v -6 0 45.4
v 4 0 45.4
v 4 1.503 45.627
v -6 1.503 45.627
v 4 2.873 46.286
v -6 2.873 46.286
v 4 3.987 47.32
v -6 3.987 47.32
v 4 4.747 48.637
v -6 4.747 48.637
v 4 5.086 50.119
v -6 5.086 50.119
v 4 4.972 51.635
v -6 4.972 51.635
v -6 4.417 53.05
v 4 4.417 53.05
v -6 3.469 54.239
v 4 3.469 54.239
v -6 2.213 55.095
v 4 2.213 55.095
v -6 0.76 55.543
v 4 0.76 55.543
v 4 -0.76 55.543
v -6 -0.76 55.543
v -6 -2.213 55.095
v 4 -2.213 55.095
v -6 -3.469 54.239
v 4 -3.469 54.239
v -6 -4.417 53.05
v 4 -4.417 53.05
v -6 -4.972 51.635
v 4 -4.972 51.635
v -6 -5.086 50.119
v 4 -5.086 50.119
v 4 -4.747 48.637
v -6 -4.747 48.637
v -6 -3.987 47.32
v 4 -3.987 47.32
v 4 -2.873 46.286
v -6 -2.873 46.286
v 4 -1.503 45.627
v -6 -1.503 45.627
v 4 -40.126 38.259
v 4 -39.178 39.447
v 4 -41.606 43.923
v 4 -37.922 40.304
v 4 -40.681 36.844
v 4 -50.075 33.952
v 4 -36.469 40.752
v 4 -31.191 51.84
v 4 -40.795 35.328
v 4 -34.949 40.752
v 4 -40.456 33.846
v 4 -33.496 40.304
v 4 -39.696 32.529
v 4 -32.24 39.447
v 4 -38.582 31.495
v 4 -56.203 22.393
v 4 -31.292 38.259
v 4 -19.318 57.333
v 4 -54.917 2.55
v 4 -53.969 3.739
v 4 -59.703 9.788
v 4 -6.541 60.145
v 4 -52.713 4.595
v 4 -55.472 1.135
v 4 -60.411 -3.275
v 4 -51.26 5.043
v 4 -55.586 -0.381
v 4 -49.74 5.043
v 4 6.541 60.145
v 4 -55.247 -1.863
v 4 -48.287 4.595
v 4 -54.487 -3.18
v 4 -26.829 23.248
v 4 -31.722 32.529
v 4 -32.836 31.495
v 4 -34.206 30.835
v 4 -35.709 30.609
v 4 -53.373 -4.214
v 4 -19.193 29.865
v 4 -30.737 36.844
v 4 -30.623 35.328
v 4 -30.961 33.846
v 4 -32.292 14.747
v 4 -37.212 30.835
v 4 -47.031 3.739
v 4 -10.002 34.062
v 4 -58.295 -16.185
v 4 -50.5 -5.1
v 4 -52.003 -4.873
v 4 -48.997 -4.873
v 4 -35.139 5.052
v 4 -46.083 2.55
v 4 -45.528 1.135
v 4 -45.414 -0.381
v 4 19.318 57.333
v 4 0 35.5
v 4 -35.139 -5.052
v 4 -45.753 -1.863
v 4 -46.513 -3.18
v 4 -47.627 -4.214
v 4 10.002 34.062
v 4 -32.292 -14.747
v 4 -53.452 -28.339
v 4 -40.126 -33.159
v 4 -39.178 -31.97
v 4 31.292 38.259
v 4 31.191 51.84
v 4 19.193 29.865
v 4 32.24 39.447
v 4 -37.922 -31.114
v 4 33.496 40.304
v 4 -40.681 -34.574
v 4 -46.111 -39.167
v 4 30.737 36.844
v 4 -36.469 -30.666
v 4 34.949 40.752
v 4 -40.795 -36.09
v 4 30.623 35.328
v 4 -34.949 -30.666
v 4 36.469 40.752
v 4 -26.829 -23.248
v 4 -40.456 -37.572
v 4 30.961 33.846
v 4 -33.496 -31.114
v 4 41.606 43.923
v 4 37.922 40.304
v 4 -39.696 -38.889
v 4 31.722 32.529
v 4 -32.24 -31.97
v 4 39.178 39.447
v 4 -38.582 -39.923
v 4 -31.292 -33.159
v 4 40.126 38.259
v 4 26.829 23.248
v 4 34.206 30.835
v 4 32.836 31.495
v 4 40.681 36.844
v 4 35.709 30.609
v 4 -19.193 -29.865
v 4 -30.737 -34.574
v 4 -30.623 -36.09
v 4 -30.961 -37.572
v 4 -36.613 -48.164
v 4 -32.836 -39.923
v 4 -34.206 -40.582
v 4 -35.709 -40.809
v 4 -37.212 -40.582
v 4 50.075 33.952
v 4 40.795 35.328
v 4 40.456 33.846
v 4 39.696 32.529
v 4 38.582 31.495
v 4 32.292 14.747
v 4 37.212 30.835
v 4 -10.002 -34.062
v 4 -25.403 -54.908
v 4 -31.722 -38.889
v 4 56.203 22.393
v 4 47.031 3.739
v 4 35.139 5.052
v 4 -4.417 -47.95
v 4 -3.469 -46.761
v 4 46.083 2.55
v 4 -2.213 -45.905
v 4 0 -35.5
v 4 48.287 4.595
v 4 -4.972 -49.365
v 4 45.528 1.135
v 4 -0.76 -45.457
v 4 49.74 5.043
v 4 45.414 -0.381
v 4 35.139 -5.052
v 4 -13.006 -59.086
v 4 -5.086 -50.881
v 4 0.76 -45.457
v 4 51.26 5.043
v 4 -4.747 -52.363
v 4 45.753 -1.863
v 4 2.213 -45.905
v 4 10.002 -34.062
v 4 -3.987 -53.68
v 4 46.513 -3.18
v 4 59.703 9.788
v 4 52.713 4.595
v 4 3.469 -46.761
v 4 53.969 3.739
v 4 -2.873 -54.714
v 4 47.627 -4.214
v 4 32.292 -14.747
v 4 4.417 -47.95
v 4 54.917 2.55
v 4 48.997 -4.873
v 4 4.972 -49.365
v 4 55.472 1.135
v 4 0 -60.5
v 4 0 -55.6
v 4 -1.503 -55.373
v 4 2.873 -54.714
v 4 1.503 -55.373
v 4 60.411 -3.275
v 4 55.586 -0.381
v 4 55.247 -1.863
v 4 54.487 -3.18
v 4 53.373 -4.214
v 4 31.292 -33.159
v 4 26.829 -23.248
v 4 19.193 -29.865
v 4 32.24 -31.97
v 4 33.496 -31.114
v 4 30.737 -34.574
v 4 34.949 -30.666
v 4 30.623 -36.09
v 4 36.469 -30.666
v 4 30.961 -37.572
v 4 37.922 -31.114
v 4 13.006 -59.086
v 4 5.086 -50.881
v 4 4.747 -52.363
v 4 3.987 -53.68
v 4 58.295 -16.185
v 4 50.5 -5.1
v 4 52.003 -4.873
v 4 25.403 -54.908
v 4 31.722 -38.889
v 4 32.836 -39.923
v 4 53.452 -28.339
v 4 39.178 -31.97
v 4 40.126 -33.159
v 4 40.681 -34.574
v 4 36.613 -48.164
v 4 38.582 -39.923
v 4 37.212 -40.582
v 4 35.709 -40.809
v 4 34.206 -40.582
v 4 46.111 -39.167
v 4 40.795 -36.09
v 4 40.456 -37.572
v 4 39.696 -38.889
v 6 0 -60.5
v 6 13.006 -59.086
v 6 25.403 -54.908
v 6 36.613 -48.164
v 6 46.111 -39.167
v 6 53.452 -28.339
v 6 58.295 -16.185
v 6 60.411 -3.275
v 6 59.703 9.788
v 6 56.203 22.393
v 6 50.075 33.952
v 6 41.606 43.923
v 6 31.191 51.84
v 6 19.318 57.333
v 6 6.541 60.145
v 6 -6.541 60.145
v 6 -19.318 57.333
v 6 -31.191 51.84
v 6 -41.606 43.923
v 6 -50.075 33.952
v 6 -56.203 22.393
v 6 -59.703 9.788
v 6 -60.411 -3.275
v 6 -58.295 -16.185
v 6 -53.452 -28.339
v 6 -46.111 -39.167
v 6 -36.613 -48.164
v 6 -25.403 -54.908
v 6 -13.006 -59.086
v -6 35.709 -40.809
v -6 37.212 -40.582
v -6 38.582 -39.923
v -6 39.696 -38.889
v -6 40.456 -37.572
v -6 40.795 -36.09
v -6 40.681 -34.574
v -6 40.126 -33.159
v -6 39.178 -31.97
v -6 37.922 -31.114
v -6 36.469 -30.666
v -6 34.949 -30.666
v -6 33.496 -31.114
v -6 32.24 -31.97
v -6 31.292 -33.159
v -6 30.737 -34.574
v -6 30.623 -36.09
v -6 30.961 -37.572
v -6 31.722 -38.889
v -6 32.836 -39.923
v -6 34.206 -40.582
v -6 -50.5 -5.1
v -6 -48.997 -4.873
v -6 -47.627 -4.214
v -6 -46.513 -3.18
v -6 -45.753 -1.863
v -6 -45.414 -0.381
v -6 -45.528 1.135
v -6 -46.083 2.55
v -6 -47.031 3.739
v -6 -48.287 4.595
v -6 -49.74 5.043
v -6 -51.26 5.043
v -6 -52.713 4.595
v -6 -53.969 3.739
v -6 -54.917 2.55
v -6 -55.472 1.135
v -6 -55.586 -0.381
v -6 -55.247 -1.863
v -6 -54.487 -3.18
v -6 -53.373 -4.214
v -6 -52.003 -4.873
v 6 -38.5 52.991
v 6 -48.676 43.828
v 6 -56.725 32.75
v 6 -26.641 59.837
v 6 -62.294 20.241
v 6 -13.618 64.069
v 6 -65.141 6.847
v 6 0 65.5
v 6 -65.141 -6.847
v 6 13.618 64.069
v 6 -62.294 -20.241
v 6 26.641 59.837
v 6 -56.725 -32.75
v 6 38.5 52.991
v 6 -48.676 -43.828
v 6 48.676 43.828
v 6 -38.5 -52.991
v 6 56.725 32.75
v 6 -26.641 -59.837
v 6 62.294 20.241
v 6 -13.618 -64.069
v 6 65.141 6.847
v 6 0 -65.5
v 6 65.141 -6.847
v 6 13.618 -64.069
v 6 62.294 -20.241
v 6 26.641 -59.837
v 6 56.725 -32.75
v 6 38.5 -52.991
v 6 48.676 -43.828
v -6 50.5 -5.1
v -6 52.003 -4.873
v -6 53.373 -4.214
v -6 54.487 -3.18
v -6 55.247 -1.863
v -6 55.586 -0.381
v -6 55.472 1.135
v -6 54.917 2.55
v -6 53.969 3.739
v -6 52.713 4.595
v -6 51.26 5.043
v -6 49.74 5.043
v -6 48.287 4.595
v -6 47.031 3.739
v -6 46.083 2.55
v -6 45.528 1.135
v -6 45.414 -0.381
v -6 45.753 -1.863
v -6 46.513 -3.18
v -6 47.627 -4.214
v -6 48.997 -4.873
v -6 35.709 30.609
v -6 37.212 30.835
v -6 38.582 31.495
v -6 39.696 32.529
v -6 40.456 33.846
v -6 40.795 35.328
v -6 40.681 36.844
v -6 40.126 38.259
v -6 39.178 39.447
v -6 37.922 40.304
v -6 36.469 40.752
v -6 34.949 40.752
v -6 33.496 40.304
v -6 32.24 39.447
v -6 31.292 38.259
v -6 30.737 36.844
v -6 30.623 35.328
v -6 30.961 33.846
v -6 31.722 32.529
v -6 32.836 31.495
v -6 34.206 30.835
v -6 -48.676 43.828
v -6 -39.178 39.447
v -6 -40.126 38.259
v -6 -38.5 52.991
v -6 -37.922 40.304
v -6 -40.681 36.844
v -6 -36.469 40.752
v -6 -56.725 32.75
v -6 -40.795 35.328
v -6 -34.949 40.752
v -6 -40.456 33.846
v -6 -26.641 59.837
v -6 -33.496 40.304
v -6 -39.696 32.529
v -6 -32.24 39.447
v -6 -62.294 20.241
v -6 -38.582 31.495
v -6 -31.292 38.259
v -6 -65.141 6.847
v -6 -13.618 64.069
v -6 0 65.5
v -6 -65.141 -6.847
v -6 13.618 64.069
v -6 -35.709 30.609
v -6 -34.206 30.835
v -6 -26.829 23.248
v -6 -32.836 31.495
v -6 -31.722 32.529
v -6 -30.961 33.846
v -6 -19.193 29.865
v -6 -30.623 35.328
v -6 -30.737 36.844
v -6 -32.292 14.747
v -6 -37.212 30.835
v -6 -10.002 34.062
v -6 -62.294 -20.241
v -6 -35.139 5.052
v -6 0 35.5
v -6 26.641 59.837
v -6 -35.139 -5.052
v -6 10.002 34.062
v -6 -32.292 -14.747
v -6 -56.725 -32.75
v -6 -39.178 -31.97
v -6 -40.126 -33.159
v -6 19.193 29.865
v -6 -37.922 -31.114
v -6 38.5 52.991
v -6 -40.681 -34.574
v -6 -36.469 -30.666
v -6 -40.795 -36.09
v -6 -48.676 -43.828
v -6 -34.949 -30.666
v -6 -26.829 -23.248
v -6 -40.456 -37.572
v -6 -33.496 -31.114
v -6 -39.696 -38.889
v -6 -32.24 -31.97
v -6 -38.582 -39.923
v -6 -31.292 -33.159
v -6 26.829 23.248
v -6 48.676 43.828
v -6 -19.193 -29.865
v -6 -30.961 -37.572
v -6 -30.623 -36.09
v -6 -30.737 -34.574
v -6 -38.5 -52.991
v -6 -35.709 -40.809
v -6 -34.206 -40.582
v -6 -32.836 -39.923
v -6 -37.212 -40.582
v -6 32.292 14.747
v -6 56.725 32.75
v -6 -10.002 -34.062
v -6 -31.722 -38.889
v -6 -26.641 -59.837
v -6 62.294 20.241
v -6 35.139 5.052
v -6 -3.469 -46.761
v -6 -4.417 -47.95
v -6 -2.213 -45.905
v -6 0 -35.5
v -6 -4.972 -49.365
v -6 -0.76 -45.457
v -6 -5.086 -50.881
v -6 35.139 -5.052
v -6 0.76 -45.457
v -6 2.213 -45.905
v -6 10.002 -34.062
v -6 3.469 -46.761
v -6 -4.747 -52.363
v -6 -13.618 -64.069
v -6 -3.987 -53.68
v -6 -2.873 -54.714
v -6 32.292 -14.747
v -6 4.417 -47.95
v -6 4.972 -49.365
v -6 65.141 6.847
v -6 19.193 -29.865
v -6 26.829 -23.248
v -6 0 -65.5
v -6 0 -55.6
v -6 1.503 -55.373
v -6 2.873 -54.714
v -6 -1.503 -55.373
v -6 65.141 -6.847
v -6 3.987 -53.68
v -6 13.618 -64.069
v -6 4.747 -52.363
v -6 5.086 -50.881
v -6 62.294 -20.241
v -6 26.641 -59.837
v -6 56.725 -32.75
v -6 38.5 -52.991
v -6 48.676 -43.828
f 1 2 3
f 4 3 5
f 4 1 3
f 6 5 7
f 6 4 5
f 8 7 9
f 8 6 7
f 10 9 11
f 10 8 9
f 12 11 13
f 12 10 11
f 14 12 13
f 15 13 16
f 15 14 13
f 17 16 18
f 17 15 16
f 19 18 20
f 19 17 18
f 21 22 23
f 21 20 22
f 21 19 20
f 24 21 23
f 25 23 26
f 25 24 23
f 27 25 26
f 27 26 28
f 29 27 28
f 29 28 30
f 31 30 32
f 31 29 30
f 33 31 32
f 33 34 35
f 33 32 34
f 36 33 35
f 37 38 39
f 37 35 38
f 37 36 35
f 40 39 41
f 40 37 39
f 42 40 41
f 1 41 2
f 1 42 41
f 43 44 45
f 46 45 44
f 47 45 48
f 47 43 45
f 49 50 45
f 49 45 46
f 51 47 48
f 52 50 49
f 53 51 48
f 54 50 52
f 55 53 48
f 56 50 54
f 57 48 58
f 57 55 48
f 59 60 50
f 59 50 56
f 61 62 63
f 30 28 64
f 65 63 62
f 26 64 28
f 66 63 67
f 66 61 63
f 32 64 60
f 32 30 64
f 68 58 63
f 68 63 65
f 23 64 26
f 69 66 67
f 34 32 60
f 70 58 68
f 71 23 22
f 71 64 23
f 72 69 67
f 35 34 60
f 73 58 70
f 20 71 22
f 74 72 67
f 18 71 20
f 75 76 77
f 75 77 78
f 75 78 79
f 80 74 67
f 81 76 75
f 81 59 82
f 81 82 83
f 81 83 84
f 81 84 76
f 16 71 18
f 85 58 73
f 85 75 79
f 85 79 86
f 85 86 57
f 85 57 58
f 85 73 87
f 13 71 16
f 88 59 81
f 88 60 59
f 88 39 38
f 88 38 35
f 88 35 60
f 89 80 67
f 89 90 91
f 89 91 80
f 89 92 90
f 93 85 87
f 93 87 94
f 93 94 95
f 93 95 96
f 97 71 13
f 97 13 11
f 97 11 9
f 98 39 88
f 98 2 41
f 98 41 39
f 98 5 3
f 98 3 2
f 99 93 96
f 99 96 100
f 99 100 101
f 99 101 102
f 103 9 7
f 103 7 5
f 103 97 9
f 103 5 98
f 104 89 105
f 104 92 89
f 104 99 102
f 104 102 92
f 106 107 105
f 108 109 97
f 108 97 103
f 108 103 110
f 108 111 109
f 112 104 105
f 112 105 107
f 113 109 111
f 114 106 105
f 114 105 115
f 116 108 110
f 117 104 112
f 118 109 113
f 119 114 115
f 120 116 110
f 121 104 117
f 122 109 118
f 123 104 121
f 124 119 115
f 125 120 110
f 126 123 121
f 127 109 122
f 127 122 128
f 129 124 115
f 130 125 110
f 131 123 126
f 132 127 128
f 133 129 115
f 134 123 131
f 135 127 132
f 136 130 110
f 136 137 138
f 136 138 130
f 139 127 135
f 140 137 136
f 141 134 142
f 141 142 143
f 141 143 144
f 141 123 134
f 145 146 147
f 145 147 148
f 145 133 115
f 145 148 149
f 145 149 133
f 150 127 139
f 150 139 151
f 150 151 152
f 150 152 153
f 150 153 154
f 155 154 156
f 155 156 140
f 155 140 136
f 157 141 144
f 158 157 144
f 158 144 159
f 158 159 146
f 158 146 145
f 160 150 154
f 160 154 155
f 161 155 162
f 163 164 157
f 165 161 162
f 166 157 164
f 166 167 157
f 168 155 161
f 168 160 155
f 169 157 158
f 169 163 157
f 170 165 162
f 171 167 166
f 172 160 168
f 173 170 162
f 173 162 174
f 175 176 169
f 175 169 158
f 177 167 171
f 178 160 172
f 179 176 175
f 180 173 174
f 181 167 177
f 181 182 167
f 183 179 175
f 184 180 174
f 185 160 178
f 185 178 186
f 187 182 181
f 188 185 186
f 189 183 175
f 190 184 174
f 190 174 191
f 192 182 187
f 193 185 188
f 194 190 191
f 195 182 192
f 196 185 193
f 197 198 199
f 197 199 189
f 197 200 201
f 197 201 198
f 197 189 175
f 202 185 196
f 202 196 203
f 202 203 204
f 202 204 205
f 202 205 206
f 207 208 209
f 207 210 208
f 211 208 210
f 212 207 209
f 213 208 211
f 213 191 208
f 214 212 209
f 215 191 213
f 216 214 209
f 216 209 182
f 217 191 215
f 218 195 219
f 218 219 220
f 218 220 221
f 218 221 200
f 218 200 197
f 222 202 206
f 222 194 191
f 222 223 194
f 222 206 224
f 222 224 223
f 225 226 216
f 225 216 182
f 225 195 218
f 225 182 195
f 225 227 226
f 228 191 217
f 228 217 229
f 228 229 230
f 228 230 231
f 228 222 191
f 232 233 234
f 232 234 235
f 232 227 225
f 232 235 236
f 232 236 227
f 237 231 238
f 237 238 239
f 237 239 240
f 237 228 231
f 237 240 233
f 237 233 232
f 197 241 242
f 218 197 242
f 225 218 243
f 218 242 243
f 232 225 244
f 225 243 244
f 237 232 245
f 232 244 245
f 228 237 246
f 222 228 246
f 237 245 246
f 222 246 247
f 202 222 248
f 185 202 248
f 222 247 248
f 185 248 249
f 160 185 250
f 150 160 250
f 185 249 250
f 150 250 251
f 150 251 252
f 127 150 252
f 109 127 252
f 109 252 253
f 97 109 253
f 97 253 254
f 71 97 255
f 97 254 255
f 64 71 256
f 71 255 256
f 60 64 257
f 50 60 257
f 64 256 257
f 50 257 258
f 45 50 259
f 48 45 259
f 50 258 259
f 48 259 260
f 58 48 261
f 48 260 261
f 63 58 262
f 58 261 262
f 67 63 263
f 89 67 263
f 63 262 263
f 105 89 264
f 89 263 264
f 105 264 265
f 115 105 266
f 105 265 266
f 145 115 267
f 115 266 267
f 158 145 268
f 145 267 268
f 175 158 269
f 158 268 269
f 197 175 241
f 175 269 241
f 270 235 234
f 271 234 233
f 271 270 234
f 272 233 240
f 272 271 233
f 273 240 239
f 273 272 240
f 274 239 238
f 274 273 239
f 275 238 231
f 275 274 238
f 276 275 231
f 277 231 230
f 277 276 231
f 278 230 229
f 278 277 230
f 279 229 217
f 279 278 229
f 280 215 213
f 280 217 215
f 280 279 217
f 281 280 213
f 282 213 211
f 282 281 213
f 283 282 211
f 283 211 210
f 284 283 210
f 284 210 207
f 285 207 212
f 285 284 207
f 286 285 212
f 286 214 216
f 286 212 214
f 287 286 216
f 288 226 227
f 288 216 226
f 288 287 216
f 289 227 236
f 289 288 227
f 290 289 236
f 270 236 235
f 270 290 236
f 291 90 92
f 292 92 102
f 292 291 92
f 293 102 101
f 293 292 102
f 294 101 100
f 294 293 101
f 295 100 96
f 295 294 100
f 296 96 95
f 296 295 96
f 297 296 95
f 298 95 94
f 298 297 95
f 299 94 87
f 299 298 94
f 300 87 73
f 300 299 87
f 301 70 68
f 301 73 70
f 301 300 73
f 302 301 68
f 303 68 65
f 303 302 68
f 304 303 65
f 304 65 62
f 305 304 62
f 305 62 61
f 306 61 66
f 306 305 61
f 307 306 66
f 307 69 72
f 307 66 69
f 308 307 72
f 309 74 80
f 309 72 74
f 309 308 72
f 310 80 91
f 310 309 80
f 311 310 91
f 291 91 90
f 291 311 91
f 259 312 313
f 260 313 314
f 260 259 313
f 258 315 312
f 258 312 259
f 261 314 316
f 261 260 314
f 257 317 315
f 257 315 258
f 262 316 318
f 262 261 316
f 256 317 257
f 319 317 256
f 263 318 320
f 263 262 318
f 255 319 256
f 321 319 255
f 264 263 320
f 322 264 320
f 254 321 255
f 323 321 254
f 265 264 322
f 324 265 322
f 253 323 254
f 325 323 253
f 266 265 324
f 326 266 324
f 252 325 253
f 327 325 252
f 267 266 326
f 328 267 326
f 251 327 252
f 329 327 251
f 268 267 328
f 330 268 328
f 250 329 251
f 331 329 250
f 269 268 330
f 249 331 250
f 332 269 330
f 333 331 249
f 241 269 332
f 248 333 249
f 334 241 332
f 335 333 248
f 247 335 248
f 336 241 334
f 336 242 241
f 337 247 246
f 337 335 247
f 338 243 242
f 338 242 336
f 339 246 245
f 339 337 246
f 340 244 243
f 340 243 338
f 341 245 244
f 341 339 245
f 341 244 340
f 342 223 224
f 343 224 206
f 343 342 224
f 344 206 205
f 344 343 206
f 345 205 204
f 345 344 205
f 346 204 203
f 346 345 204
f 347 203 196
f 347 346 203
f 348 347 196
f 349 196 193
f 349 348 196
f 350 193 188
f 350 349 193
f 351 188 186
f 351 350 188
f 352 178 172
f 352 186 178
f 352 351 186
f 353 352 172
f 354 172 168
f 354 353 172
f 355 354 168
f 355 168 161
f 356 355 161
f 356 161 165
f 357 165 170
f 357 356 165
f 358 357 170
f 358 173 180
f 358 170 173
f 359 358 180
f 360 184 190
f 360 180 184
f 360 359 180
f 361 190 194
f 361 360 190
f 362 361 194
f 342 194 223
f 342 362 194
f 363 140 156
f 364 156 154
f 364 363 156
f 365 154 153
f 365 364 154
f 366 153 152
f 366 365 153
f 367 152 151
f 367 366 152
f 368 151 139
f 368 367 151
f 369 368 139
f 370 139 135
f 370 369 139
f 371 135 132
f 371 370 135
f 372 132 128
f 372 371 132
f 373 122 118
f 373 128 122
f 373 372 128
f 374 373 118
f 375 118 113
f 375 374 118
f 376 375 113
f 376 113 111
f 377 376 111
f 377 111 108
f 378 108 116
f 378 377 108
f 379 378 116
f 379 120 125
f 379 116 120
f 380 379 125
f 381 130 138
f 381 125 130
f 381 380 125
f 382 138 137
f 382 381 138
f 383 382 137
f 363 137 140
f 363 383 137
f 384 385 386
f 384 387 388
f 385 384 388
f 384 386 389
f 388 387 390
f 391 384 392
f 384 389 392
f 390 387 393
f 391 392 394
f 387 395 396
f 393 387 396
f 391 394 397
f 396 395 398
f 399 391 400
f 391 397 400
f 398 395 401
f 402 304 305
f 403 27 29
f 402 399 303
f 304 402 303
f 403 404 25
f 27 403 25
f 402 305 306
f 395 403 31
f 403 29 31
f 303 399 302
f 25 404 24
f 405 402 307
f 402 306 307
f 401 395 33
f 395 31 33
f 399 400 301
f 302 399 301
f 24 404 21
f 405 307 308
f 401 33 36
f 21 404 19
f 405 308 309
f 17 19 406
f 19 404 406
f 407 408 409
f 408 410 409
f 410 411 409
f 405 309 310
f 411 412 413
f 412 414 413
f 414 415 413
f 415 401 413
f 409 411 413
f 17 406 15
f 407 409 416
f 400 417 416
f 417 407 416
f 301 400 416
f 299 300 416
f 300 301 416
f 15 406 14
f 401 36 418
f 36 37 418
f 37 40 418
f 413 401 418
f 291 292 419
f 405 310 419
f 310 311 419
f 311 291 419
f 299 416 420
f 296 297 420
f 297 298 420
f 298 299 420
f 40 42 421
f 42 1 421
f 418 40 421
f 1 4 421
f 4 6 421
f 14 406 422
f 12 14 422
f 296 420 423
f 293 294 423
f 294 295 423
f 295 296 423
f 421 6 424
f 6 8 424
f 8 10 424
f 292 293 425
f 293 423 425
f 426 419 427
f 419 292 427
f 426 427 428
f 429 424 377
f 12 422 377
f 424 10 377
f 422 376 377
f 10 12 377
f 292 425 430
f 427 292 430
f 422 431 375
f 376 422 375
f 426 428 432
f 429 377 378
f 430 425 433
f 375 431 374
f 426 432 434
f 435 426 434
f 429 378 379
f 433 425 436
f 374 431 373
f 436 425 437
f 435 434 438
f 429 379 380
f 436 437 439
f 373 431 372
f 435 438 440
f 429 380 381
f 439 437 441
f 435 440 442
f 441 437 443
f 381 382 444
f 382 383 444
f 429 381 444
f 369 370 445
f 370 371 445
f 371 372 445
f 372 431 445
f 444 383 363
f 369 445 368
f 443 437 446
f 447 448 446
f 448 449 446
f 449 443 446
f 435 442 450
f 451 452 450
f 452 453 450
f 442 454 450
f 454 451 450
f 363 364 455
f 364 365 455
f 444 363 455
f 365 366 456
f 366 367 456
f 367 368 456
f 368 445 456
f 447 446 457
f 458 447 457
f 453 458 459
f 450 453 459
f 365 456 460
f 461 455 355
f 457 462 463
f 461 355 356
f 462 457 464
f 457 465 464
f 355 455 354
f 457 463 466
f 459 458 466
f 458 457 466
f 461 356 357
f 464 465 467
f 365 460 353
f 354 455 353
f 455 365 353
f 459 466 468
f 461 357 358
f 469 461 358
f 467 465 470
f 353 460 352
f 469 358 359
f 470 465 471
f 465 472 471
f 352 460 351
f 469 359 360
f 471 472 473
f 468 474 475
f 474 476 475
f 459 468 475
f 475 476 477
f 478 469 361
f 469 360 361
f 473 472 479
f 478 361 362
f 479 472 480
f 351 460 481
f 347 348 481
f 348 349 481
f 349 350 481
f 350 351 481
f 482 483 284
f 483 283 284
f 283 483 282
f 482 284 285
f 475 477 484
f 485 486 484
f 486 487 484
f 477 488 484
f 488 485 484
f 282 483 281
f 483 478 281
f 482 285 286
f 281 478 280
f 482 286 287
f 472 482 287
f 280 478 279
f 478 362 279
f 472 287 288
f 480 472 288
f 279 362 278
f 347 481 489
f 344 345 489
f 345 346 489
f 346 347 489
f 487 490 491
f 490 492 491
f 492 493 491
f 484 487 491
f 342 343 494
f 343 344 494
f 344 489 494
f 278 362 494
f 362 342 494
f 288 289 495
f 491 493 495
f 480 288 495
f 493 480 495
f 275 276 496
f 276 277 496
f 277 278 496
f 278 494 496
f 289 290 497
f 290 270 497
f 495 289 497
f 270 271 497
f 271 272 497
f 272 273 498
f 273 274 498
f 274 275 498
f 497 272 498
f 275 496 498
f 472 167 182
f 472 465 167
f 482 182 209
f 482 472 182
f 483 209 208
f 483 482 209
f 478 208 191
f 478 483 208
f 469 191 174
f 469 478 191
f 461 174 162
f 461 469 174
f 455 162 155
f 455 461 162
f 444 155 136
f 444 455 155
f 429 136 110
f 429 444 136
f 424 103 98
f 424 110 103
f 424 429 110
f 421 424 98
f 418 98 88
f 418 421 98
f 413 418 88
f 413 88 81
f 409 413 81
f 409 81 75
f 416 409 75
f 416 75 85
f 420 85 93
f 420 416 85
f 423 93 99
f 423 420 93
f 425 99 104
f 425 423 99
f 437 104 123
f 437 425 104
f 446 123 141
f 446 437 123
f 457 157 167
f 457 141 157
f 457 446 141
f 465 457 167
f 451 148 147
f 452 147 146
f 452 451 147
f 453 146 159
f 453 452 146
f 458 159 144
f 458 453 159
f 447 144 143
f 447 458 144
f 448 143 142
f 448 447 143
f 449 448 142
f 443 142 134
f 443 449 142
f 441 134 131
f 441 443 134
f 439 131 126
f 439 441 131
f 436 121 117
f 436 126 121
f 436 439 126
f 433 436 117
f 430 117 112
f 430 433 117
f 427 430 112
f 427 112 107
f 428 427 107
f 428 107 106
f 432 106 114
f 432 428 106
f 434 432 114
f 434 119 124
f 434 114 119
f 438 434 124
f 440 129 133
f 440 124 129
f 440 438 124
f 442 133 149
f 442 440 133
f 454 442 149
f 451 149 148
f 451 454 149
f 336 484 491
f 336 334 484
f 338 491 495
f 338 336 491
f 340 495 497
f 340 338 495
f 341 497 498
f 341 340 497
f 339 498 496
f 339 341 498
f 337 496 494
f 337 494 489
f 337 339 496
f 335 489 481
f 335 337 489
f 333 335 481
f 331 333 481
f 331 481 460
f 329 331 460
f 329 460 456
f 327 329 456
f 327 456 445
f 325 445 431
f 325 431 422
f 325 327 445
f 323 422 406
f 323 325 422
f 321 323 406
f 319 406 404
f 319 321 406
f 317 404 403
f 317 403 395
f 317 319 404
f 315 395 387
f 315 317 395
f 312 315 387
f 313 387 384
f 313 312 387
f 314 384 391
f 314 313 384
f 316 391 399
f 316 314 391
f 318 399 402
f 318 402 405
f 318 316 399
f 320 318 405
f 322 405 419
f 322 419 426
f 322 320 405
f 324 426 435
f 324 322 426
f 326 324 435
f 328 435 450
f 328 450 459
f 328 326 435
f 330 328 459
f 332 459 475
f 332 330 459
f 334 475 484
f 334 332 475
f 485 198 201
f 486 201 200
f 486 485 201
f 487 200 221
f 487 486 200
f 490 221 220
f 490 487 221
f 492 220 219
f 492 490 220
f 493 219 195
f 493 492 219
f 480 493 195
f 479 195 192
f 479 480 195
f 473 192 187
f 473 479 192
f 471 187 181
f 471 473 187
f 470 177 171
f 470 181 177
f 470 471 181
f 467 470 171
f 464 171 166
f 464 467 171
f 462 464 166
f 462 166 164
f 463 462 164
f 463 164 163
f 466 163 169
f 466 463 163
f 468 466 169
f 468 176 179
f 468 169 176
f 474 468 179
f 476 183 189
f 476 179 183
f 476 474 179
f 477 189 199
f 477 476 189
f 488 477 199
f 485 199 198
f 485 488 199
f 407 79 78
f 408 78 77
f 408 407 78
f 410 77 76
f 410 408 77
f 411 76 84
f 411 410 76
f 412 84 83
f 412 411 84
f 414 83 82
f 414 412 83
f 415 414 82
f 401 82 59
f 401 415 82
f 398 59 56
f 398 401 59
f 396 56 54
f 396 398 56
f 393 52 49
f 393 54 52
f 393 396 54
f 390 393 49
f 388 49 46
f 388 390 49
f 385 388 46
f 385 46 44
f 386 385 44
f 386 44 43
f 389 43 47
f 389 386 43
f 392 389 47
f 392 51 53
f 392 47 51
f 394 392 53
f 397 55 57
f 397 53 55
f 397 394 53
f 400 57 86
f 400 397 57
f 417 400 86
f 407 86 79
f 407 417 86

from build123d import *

# Parameters (mm, degrees)
SKETCH_1_R           = 65.5
SKETCH_1_R_2         = 35.5
SKETCH_1_R_3         = 5.1
EXTRUDE_1_DEPTH      = 6
SKETCH_2_OUTSIDE_W   = 170.13
SKETCH_2_OUTSIDE_H   = 170.13
SKETCH_2_OUTSIDE_R   = 65.5
SKETCH_2_OUTSIDE_R_2 = 60.5
CUT_EXTRUDE_1_DEPTH  = 2


with BuildPart() as part:
    # Эскиз1 → Бобышка-Вытянуть1 (new, symmetric)
    with BuildSketch(Plane(origin=(0, 0, 0), x_dir=(0, 0, -1), z_dir=(1, 0, 0))):
        Circle(SKETCH_1_R)
        Circle(SKETCH_1_R_2, mode=Mode.SUBTRACT)
        with Locations((0, 50.5)):
            Circle(SKETCH_1_R_3, mode=Mode.SUBTRACT)
        with Locations((35.70889245, 35.70889245)):
            Circle(SKETCH_1_R_3, mode=Mode.SUBTRACT)
        with Locations((50.5, 0)):
            Circle(SKETCH_1_R_3, mode=Mode.SUBTRACT)
        with Locations((35.70889245, -35.70889245)):
            Circle(SKETCH_1_R_3, mode=Mode.SUBTRACT)
        with Locations((0, -50.5)):
            Circle(SKETCH_1_R_3, mode=Mode.SUBTRACT)
        with Locations((-35.70889245, -35.70889245)):
            Circle(SKETCH_1_R_3, mode=Mode.SUBTRACT)
        with Locations((-50.5, 0)):
            Circle(SKETCH_1_R_3, mode=Mode.SUBTRACT)
        with Locations((-35.70889245, 35.70889245)):
            Circle(SKETCH_1_R_3, mode=Mode.SUBTRACT)
    extrude(amount=EXTRUDE_1_DEPTH, both=True)

    # Эскиз2 outside → Вырез-Вытянуть1 (cut)
    # profile 1 of 2: a face of its own
    with BuildSketch(Plane(origin=(6, 0, 0), x_dir=(0, 0, -1), z_dir=(1, 0, 0))):
        Rectangle(SKETCH_2_OUTSIDE_W, SKETCH_2_OUTSIDE_H)
        Circle(SKETCH_2_OUTSIDE_R, mode=Mode.SUBTRACT)
    # profile 2 of 2: a face of its own
    with BuildSketch(Plane(origin=(6, 0, 0), x_dir=(0, 0, -1), z_dir=(1, 0, 0))):
        Circle(SKETCH_2_OUTSIDE_R_2)
    extrude(amount=-CUT_EXTRUDE_1_DEPTH, mode=Mode.SUBTRACT)


solid = part.part
